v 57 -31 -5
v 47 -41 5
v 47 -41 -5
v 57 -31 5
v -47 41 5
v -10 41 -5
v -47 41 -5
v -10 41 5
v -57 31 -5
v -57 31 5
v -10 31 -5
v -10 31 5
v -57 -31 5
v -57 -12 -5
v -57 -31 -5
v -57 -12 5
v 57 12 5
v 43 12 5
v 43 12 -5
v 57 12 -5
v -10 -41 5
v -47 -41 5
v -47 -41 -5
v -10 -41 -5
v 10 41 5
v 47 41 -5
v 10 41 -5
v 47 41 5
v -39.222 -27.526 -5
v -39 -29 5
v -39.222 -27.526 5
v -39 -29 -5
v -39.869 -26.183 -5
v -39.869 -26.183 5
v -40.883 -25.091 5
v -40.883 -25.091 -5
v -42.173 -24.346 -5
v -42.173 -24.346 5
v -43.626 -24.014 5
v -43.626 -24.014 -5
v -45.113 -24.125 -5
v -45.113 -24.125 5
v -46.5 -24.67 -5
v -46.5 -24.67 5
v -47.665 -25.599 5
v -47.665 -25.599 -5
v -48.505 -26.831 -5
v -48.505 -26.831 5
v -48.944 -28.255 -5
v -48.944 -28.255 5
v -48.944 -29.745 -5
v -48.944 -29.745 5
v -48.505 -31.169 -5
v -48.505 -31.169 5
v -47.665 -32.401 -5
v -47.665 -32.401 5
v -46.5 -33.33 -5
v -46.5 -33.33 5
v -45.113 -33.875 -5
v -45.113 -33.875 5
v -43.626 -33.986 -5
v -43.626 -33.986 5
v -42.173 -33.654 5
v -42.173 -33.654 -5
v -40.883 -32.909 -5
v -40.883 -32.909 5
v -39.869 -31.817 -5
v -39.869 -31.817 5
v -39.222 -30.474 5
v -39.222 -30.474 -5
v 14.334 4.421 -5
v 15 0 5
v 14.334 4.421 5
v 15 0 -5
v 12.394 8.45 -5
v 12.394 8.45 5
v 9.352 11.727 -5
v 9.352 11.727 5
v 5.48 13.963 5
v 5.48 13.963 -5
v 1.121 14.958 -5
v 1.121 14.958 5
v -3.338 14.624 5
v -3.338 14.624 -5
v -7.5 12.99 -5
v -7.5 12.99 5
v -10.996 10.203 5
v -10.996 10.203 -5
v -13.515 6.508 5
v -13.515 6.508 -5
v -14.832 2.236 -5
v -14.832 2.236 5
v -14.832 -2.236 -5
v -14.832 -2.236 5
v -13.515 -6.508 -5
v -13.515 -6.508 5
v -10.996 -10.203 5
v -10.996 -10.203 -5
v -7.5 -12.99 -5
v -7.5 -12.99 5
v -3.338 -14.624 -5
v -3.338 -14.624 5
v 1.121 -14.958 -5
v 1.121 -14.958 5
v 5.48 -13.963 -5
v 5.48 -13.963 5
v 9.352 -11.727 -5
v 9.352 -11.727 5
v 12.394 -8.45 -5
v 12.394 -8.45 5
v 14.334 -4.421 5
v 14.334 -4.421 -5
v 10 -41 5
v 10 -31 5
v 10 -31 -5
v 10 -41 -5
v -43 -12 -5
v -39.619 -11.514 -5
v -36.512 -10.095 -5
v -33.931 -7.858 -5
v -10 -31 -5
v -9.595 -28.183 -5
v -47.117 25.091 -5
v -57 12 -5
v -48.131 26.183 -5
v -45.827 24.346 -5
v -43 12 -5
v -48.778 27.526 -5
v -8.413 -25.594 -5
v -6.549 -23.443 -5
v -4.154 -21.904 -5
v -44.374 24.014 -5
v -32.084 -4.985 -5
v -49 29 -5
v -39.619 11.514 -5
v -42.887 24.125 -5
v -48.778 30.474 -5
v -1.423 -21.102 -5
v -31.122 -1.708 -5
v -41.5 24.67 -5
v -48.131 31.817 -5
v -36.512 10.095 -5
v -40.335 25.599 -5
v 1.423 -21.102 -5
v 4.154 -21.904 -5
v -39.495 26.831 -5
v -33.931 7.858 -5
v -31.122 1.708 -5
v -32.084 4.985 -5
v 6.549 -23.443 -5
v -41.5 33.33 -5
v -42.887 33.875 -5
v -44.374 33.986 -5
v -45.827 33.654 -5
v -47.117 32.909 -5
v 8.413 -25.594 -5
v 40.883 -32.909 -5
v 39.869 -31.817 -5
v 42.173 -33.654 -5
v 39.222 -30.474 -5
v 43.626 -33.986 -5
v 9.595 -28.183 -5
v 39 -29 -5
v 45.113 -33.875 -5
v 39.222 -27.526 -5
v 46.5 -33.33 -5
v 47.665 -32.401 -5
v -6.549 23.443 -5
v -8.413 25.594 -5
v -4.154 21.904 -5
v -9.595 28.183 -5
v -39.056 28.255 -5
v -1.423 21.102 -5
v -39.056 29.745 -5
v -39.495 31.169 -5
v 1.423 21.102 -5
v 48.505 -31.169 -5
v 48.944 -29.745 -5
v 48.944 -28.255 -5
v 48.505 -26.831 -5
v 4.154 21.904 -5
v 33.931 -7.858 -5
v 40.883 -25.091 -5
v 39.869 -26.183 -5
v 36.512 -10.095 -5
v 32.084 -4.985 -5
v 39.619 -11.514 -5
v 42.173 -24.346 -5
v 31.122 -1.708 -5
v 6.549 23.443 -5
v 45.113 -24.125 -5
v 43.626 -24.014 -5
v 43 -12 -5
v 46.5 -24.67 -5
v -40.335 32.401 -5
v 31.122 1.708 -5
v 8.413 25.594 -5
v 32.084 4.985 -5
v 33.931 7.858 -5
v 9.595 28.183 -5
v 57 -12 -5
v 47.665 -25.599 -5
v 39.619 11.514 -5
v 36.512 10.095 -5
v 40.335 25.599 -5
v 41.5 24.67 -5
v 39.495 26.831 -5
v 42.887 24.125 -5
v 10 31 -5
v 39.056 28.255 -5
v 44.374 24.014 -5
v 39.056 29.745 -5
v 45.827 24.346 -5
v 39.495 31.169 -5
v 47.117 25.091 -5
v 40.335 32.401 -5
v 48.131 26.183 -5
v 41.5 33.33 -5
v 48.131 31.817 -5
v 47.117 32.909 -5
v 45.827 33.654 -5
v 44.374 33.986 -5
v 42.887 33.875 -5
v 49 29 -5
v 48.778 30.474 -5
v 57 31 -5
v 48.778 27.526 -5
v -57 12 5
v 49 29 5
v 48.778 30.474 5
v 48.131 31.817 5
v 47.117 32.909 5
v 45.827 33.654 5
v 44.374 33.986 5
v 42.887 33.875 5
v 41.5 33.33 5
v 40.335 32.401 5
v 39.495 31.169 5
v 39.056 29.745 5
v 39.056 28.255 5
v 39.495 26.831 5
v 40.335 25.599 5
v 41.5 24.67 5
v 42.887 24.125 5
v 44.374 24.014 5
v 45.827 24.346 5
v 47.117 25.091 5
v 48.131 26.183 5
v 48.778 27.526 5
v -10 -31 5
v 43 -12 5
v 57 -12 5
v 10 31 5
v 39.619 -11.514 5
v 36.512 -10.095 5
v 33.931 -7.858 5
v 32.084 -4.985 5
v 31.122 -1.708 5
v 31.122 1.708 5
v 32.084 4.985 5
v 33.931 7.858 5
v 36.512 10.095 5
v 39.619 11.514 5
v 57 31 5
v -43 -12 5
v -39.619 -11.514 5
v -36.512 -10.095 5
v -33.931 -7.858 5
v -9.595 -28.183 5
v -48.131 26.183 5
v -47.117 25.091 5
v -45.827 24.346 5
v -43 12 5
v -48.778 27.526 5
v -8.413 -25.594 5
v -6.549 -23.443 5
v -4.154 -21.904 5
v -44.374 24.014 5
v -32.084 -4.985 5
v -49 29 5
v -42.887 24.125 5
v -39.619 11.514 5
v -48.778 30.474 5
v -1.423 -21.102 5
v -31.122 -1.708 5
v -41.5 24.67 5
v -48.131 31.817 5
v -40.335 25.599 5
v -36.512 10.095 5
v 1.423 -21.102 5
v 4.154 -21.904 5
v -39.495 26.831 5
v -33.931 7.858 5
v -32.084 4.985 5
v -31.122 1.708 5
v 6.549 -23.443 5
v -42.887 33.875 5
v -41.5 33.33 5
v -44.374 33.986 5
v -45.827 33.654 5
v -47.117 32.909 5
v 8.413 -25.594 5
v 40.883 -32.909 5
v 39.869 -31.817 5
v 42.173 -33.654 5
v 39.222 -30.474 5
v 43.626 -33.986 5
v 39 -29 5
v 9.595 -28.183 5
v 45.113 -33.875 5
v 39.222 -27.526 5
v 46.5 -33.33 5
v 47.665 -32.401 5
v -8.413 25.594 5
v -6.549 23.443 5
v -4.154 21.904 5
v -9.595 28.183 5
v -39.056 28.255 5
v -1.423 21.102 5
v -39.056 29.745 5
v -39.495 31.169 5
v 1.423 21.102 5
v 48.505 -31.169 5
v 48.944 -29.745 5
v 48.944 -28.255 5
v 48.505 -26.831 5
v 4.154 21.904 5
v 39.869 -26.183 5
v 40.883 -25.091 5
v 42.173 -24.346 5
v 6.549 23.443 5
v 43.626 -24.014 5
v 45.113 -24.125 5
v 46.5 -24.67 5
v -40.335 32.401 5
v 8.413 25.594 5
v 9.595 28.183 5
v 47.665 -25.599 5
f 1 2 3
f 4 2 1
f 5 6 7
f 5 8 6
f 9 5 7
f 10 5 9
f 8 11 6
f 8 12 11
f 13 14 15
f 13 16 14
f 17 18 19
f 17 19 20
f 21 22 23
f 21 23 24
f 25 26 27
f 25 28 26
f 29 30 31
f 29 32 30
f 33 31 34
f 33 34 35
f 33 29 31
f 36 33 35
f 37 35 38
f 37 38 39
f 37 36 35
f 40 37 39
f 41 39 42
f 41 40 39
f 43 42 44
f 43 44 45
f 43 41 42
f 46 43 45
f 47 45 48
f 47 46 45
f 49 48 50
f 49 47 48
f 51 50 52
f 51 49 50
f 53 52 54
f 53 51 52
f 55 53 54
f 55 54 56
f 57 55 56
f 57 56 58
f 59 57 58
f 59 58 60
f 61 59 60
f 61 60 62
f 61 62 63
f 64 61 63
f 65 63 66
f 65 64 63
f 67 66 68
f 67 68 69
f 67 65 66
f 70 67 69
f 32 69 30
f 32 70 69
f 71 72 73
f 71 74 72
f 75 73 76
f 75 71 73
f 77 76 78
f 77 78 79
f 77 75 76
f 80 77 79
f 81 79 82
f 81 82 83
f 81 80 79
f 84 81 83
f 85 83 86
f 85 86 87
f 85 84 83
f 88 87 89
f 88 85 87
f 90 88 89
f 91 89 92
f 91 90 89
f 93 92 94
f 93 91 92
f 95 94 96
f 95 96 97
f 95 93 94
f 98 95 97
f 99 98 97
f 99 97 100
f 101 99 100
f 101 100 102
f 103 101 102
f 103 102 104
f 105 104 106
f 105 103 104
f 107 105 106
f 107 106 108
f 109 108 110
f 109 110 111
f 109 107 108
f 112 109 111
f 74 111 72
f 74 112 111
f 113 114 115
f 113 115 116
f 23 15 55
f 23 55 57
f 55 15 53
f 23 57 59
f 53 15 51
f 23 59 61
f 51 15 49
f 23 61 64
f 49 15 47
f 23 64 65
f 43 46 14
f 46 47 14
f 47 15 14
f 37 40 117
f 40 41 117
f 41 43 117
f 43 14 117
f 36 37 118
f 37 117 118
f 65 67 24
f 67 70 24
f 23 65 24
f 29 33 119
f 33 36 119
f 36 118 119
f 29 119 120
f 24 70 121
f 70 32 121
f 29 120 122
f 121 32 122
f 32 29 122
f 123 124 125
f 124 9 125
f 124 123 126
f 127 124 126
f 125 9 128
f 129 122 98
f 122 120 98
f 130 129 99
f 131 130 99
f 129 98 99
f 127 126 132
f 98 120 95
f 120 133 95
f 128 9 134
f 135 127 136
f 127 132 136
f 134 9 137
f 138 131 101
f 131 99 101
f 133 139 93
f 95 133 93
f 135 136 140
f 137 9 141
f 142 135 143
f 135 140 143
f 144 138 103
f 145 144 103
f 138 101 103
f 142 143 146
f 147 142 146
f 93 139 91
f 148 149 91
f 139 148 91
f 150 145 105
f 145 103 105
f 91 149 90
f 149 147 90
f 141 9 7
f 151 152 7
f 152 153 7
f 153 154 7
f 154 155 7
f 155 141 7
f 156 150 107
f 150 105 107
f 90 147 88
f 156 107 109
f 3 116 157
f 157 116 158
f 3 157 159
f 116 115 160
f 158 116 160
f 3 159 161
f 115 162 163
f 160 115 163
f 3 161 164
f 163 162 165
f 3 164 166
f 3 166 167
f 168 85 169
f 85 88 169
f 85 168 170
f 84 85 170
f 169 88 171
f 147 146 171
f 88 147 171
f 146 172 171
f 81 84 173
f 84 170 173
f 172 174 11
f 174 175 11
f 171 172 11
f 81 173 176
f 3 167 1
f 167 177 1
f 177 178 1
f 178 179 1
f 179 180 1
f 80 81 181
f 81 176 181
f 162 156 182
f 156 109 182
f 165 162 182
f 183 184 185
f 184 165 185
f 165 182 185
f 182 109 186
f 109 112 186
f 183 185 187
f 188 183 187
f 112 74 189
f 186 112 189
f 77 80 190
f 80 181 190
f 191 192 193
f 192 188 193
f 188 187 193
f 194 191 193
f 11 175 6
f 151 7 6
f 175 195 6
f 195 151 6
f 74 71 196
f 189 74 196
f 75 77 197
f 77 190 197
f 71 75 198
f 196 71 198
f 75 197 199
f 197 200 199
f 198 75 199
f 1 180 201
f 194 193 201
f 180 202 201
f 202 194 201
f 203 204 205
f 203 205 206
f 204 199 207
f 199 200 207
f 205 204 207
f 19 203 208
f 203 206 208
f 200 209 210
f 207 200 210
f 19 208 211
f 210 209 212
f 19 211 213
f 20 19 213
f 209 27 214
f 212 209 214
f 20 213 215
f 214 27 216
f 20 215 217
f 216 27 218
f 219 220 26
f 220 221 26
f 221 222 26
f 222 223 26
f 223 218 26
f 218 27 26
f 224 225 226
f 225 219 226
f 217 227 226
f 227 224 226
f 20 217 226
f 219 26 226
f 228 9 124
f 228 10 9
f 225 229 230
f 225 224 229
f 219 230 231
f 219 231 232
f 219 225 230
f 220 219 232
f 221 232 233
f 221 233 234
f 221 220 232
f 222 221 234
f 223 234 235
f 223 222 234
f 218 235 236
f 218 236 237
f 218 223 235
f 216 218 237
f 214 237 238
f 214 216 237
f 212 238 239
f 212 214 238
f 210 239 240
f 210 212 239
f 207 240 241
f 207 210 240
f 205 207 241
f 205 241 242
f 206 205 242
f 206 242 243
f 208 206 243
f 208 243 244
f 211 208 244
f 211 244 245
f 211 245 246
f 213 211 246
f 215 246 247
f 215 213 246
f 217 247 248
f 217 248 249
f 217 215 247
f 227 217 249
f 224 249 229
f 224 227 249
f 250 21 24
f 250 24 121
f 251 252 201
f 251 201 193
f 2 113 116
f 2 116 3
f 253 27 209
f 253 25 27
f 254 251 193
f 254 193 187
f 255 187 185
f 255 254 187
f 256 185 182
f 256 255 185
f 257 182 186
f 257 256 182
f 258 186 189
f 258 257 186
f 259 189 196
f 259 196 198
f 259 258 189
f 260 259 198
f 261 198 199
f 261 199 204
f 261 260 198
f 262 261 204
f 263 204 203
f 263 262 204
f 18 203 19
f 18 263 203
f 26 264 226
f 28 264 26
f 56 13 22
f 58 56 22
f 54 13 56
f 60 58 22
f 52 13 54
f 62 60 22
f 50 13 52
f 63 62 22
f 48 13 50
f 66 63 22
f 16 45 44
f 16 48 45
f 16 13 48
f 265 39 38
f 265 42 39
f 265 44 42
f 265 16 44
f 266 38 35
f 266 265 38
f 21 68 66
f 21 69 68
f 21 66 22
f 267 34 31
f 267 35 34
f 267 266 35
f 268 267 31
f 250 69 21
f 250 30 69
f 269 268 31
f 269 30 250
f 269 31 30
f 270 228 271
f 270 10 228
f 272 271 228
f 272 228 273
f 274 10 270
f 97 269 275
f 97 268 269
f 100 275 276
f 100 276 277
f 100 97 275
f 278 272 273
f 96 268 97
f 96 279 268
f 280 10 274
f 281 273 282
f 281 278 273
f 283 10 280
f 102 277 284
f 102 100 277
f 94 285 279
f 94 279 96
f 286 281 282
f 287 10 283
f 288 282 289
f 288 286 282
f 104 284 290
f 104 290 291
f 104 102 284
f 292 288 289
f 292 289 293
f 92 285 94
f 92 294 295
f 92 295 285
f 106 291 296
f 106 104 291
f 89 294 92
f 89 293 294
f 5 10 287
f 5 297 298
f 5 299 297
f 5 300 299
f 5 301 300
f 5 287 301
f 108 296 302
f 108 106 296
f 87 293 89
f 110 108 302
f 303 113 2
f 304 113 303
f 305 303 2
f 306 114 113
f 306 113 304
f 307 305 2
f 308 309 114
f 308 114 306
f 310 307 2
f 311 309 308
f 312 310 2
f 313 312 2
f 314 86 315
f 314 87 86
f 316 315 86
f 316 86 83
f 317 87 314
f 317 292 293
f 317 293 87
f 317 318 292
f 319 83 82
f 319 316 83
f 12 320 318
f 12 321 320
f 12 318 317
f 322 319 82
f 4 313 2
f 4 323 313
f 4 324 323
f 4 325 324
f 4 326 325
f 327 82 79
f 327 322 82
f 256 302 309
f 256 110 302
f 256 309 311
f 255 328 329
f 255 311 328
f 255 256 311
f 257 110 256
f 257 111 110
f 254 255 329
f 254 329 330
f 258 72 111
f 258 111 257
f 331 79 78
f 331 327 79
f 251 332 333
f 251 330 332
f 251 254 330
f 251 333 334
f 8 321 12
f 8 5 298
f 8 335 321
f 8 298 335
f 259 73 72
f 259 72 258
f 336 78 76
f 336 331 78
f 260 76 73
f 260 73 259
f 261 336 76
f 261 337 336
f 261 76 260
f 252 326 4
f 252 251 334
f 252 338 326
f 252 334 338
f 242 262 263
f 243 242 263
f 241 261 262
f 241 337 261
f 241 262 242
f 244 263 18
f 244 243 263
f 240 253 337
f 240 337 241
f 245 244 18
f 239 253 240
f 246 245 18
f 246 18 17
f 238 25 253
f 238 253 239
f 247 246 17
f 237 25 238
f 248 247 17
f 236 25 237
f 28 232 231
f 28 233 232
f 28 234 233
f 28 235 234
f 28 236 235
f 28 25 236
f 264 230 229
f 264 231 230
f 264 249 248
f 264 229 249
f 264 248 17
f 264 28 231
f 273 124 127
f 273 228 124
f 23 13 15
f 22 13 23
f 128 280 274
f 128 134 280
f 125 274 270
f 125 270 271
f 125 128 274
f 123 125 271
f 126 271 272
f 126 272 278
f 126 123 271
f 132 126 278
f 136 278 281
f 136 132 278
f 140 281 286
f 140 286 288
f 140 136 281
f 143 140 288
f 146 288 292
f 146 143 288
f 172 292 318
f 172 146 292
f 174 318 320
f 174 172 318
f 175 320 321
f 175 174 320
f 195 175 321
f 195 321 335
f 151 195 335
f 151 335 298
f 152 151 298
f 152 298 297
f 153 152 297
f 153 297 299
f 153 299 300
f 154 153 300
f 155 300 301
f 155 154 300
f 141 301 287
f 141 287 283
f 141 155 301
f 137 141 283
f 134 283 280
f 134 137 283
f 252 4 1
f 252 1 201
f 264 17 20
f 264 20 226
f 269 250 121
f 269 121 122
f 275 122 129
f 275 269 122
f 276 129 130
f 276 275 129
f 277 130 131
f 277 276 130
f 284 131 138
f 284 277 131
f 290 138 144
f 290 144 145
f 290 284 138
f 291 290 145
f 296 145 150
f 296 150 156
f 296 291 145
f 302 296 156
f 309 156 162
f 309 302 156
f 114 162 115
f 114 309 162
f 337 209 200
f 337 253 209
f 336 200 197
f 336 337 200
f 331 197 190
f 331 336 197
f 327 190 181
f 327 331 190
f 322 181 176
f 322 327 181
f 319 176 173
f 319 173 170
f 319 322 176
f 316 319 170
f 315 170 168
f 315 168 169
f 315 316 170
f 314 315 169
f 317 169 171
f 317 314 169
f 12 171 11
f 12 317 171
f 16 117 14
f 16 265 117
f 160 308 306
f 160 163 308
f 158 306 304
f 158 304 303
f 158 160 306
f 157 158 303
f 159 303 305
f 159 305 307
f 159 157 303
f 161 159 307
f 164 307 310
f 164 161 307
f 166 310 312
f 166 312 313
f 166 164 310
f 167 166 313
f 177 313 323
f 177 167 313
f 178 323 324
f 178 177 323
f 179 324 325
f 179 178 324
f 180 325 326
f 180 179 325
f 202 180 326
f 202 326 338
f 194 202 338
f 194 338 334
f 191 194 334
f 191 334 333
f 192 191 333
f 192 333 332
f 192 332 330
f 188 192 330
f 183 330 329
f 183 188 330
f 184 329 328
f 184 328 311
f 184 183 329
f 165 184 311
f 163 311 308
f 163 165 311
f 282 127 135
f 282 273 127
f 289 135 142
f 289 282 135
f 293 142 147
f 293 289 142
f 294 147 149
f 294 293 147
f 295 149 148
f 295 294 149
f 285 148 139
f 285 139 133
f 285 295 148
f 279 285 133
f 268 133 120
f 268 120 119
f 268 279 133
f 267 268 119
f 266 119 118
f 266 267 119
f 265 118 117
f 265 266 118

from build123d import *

# Parameters (mm, degrees)
SKETCH1_R           = 5
SKETCH1_R_2         = 15
BOSS_EXTRUDE1_DEPTH = 5


with BuildPart() as part:
    # Sketch1 → Boss-Extrude1 (new, symmetric)
    with BuildSketch(Plane.XY):
        with BuildLine():
            Line((-57, -31), (-47, -41))
            Line((-47, -41), (-10, -41))
            Line((-10, -41), (-10, -31))
            ThreePointArc((-10, -31), (0, -21), (10, -31))
            Line((10, -31), (10, -41))
            Line((10, -41), (47, -41))
            Line((47, -41), (57, -31))
            Line((57, -31), (57, -12))
            Line((57, -12), (43, -12))
            ThreePointArc((43, -12), (31, 0), (43, 12))
            Line((43, 12), (57, 12))
            Line((57, 12), (57, 31))
            Line((57, 31), (47, 41))
            Line((47, 41), (10, 41))
            Line((10, 41), (10, 31))
            ThreePointArc((10, 31), (0, 21), (-10, 31))
            Line((-10, 31), (-10, 41))
            Line((-10, 41), (-47, 41))
            Line((-47, 41), (-57, 31))
            Line((-57, 31), (-57, 12))
            Line((-57, 12), (-43, 12))
            ThreePointArc((-43, 12), (-31, 0), (-43, -12))
            Line((-43, -12), (-57, -12))
            Line((-57, -12), (-57, -31))
        make_face()
        with Locations((-44, -29)):
            Circle(SKETCH1_R, mode=Mode.SUBTRACT)
        with Locations(Location((-44, 29, 0), (0, 0, 180))):
            Circle(SKETCH1_R, mode=Mode.SUBTRACT)
        with Locations(Location((44, -29, 0), (0, 0, 180))):
            Circle(SKETCH1_R, mode=Mode.SUBTRACT)
        with Locations((44, 29)):
            Circle(SKETCH1_R, mode=Mode.SUBTRACT)
        Circle(SKETCH1_R_2, mode=Mode.SUBTRACT)
    extrude(amount=BOSS_EXTRUDE1_DEPTH, both=True)


solid = part.part
